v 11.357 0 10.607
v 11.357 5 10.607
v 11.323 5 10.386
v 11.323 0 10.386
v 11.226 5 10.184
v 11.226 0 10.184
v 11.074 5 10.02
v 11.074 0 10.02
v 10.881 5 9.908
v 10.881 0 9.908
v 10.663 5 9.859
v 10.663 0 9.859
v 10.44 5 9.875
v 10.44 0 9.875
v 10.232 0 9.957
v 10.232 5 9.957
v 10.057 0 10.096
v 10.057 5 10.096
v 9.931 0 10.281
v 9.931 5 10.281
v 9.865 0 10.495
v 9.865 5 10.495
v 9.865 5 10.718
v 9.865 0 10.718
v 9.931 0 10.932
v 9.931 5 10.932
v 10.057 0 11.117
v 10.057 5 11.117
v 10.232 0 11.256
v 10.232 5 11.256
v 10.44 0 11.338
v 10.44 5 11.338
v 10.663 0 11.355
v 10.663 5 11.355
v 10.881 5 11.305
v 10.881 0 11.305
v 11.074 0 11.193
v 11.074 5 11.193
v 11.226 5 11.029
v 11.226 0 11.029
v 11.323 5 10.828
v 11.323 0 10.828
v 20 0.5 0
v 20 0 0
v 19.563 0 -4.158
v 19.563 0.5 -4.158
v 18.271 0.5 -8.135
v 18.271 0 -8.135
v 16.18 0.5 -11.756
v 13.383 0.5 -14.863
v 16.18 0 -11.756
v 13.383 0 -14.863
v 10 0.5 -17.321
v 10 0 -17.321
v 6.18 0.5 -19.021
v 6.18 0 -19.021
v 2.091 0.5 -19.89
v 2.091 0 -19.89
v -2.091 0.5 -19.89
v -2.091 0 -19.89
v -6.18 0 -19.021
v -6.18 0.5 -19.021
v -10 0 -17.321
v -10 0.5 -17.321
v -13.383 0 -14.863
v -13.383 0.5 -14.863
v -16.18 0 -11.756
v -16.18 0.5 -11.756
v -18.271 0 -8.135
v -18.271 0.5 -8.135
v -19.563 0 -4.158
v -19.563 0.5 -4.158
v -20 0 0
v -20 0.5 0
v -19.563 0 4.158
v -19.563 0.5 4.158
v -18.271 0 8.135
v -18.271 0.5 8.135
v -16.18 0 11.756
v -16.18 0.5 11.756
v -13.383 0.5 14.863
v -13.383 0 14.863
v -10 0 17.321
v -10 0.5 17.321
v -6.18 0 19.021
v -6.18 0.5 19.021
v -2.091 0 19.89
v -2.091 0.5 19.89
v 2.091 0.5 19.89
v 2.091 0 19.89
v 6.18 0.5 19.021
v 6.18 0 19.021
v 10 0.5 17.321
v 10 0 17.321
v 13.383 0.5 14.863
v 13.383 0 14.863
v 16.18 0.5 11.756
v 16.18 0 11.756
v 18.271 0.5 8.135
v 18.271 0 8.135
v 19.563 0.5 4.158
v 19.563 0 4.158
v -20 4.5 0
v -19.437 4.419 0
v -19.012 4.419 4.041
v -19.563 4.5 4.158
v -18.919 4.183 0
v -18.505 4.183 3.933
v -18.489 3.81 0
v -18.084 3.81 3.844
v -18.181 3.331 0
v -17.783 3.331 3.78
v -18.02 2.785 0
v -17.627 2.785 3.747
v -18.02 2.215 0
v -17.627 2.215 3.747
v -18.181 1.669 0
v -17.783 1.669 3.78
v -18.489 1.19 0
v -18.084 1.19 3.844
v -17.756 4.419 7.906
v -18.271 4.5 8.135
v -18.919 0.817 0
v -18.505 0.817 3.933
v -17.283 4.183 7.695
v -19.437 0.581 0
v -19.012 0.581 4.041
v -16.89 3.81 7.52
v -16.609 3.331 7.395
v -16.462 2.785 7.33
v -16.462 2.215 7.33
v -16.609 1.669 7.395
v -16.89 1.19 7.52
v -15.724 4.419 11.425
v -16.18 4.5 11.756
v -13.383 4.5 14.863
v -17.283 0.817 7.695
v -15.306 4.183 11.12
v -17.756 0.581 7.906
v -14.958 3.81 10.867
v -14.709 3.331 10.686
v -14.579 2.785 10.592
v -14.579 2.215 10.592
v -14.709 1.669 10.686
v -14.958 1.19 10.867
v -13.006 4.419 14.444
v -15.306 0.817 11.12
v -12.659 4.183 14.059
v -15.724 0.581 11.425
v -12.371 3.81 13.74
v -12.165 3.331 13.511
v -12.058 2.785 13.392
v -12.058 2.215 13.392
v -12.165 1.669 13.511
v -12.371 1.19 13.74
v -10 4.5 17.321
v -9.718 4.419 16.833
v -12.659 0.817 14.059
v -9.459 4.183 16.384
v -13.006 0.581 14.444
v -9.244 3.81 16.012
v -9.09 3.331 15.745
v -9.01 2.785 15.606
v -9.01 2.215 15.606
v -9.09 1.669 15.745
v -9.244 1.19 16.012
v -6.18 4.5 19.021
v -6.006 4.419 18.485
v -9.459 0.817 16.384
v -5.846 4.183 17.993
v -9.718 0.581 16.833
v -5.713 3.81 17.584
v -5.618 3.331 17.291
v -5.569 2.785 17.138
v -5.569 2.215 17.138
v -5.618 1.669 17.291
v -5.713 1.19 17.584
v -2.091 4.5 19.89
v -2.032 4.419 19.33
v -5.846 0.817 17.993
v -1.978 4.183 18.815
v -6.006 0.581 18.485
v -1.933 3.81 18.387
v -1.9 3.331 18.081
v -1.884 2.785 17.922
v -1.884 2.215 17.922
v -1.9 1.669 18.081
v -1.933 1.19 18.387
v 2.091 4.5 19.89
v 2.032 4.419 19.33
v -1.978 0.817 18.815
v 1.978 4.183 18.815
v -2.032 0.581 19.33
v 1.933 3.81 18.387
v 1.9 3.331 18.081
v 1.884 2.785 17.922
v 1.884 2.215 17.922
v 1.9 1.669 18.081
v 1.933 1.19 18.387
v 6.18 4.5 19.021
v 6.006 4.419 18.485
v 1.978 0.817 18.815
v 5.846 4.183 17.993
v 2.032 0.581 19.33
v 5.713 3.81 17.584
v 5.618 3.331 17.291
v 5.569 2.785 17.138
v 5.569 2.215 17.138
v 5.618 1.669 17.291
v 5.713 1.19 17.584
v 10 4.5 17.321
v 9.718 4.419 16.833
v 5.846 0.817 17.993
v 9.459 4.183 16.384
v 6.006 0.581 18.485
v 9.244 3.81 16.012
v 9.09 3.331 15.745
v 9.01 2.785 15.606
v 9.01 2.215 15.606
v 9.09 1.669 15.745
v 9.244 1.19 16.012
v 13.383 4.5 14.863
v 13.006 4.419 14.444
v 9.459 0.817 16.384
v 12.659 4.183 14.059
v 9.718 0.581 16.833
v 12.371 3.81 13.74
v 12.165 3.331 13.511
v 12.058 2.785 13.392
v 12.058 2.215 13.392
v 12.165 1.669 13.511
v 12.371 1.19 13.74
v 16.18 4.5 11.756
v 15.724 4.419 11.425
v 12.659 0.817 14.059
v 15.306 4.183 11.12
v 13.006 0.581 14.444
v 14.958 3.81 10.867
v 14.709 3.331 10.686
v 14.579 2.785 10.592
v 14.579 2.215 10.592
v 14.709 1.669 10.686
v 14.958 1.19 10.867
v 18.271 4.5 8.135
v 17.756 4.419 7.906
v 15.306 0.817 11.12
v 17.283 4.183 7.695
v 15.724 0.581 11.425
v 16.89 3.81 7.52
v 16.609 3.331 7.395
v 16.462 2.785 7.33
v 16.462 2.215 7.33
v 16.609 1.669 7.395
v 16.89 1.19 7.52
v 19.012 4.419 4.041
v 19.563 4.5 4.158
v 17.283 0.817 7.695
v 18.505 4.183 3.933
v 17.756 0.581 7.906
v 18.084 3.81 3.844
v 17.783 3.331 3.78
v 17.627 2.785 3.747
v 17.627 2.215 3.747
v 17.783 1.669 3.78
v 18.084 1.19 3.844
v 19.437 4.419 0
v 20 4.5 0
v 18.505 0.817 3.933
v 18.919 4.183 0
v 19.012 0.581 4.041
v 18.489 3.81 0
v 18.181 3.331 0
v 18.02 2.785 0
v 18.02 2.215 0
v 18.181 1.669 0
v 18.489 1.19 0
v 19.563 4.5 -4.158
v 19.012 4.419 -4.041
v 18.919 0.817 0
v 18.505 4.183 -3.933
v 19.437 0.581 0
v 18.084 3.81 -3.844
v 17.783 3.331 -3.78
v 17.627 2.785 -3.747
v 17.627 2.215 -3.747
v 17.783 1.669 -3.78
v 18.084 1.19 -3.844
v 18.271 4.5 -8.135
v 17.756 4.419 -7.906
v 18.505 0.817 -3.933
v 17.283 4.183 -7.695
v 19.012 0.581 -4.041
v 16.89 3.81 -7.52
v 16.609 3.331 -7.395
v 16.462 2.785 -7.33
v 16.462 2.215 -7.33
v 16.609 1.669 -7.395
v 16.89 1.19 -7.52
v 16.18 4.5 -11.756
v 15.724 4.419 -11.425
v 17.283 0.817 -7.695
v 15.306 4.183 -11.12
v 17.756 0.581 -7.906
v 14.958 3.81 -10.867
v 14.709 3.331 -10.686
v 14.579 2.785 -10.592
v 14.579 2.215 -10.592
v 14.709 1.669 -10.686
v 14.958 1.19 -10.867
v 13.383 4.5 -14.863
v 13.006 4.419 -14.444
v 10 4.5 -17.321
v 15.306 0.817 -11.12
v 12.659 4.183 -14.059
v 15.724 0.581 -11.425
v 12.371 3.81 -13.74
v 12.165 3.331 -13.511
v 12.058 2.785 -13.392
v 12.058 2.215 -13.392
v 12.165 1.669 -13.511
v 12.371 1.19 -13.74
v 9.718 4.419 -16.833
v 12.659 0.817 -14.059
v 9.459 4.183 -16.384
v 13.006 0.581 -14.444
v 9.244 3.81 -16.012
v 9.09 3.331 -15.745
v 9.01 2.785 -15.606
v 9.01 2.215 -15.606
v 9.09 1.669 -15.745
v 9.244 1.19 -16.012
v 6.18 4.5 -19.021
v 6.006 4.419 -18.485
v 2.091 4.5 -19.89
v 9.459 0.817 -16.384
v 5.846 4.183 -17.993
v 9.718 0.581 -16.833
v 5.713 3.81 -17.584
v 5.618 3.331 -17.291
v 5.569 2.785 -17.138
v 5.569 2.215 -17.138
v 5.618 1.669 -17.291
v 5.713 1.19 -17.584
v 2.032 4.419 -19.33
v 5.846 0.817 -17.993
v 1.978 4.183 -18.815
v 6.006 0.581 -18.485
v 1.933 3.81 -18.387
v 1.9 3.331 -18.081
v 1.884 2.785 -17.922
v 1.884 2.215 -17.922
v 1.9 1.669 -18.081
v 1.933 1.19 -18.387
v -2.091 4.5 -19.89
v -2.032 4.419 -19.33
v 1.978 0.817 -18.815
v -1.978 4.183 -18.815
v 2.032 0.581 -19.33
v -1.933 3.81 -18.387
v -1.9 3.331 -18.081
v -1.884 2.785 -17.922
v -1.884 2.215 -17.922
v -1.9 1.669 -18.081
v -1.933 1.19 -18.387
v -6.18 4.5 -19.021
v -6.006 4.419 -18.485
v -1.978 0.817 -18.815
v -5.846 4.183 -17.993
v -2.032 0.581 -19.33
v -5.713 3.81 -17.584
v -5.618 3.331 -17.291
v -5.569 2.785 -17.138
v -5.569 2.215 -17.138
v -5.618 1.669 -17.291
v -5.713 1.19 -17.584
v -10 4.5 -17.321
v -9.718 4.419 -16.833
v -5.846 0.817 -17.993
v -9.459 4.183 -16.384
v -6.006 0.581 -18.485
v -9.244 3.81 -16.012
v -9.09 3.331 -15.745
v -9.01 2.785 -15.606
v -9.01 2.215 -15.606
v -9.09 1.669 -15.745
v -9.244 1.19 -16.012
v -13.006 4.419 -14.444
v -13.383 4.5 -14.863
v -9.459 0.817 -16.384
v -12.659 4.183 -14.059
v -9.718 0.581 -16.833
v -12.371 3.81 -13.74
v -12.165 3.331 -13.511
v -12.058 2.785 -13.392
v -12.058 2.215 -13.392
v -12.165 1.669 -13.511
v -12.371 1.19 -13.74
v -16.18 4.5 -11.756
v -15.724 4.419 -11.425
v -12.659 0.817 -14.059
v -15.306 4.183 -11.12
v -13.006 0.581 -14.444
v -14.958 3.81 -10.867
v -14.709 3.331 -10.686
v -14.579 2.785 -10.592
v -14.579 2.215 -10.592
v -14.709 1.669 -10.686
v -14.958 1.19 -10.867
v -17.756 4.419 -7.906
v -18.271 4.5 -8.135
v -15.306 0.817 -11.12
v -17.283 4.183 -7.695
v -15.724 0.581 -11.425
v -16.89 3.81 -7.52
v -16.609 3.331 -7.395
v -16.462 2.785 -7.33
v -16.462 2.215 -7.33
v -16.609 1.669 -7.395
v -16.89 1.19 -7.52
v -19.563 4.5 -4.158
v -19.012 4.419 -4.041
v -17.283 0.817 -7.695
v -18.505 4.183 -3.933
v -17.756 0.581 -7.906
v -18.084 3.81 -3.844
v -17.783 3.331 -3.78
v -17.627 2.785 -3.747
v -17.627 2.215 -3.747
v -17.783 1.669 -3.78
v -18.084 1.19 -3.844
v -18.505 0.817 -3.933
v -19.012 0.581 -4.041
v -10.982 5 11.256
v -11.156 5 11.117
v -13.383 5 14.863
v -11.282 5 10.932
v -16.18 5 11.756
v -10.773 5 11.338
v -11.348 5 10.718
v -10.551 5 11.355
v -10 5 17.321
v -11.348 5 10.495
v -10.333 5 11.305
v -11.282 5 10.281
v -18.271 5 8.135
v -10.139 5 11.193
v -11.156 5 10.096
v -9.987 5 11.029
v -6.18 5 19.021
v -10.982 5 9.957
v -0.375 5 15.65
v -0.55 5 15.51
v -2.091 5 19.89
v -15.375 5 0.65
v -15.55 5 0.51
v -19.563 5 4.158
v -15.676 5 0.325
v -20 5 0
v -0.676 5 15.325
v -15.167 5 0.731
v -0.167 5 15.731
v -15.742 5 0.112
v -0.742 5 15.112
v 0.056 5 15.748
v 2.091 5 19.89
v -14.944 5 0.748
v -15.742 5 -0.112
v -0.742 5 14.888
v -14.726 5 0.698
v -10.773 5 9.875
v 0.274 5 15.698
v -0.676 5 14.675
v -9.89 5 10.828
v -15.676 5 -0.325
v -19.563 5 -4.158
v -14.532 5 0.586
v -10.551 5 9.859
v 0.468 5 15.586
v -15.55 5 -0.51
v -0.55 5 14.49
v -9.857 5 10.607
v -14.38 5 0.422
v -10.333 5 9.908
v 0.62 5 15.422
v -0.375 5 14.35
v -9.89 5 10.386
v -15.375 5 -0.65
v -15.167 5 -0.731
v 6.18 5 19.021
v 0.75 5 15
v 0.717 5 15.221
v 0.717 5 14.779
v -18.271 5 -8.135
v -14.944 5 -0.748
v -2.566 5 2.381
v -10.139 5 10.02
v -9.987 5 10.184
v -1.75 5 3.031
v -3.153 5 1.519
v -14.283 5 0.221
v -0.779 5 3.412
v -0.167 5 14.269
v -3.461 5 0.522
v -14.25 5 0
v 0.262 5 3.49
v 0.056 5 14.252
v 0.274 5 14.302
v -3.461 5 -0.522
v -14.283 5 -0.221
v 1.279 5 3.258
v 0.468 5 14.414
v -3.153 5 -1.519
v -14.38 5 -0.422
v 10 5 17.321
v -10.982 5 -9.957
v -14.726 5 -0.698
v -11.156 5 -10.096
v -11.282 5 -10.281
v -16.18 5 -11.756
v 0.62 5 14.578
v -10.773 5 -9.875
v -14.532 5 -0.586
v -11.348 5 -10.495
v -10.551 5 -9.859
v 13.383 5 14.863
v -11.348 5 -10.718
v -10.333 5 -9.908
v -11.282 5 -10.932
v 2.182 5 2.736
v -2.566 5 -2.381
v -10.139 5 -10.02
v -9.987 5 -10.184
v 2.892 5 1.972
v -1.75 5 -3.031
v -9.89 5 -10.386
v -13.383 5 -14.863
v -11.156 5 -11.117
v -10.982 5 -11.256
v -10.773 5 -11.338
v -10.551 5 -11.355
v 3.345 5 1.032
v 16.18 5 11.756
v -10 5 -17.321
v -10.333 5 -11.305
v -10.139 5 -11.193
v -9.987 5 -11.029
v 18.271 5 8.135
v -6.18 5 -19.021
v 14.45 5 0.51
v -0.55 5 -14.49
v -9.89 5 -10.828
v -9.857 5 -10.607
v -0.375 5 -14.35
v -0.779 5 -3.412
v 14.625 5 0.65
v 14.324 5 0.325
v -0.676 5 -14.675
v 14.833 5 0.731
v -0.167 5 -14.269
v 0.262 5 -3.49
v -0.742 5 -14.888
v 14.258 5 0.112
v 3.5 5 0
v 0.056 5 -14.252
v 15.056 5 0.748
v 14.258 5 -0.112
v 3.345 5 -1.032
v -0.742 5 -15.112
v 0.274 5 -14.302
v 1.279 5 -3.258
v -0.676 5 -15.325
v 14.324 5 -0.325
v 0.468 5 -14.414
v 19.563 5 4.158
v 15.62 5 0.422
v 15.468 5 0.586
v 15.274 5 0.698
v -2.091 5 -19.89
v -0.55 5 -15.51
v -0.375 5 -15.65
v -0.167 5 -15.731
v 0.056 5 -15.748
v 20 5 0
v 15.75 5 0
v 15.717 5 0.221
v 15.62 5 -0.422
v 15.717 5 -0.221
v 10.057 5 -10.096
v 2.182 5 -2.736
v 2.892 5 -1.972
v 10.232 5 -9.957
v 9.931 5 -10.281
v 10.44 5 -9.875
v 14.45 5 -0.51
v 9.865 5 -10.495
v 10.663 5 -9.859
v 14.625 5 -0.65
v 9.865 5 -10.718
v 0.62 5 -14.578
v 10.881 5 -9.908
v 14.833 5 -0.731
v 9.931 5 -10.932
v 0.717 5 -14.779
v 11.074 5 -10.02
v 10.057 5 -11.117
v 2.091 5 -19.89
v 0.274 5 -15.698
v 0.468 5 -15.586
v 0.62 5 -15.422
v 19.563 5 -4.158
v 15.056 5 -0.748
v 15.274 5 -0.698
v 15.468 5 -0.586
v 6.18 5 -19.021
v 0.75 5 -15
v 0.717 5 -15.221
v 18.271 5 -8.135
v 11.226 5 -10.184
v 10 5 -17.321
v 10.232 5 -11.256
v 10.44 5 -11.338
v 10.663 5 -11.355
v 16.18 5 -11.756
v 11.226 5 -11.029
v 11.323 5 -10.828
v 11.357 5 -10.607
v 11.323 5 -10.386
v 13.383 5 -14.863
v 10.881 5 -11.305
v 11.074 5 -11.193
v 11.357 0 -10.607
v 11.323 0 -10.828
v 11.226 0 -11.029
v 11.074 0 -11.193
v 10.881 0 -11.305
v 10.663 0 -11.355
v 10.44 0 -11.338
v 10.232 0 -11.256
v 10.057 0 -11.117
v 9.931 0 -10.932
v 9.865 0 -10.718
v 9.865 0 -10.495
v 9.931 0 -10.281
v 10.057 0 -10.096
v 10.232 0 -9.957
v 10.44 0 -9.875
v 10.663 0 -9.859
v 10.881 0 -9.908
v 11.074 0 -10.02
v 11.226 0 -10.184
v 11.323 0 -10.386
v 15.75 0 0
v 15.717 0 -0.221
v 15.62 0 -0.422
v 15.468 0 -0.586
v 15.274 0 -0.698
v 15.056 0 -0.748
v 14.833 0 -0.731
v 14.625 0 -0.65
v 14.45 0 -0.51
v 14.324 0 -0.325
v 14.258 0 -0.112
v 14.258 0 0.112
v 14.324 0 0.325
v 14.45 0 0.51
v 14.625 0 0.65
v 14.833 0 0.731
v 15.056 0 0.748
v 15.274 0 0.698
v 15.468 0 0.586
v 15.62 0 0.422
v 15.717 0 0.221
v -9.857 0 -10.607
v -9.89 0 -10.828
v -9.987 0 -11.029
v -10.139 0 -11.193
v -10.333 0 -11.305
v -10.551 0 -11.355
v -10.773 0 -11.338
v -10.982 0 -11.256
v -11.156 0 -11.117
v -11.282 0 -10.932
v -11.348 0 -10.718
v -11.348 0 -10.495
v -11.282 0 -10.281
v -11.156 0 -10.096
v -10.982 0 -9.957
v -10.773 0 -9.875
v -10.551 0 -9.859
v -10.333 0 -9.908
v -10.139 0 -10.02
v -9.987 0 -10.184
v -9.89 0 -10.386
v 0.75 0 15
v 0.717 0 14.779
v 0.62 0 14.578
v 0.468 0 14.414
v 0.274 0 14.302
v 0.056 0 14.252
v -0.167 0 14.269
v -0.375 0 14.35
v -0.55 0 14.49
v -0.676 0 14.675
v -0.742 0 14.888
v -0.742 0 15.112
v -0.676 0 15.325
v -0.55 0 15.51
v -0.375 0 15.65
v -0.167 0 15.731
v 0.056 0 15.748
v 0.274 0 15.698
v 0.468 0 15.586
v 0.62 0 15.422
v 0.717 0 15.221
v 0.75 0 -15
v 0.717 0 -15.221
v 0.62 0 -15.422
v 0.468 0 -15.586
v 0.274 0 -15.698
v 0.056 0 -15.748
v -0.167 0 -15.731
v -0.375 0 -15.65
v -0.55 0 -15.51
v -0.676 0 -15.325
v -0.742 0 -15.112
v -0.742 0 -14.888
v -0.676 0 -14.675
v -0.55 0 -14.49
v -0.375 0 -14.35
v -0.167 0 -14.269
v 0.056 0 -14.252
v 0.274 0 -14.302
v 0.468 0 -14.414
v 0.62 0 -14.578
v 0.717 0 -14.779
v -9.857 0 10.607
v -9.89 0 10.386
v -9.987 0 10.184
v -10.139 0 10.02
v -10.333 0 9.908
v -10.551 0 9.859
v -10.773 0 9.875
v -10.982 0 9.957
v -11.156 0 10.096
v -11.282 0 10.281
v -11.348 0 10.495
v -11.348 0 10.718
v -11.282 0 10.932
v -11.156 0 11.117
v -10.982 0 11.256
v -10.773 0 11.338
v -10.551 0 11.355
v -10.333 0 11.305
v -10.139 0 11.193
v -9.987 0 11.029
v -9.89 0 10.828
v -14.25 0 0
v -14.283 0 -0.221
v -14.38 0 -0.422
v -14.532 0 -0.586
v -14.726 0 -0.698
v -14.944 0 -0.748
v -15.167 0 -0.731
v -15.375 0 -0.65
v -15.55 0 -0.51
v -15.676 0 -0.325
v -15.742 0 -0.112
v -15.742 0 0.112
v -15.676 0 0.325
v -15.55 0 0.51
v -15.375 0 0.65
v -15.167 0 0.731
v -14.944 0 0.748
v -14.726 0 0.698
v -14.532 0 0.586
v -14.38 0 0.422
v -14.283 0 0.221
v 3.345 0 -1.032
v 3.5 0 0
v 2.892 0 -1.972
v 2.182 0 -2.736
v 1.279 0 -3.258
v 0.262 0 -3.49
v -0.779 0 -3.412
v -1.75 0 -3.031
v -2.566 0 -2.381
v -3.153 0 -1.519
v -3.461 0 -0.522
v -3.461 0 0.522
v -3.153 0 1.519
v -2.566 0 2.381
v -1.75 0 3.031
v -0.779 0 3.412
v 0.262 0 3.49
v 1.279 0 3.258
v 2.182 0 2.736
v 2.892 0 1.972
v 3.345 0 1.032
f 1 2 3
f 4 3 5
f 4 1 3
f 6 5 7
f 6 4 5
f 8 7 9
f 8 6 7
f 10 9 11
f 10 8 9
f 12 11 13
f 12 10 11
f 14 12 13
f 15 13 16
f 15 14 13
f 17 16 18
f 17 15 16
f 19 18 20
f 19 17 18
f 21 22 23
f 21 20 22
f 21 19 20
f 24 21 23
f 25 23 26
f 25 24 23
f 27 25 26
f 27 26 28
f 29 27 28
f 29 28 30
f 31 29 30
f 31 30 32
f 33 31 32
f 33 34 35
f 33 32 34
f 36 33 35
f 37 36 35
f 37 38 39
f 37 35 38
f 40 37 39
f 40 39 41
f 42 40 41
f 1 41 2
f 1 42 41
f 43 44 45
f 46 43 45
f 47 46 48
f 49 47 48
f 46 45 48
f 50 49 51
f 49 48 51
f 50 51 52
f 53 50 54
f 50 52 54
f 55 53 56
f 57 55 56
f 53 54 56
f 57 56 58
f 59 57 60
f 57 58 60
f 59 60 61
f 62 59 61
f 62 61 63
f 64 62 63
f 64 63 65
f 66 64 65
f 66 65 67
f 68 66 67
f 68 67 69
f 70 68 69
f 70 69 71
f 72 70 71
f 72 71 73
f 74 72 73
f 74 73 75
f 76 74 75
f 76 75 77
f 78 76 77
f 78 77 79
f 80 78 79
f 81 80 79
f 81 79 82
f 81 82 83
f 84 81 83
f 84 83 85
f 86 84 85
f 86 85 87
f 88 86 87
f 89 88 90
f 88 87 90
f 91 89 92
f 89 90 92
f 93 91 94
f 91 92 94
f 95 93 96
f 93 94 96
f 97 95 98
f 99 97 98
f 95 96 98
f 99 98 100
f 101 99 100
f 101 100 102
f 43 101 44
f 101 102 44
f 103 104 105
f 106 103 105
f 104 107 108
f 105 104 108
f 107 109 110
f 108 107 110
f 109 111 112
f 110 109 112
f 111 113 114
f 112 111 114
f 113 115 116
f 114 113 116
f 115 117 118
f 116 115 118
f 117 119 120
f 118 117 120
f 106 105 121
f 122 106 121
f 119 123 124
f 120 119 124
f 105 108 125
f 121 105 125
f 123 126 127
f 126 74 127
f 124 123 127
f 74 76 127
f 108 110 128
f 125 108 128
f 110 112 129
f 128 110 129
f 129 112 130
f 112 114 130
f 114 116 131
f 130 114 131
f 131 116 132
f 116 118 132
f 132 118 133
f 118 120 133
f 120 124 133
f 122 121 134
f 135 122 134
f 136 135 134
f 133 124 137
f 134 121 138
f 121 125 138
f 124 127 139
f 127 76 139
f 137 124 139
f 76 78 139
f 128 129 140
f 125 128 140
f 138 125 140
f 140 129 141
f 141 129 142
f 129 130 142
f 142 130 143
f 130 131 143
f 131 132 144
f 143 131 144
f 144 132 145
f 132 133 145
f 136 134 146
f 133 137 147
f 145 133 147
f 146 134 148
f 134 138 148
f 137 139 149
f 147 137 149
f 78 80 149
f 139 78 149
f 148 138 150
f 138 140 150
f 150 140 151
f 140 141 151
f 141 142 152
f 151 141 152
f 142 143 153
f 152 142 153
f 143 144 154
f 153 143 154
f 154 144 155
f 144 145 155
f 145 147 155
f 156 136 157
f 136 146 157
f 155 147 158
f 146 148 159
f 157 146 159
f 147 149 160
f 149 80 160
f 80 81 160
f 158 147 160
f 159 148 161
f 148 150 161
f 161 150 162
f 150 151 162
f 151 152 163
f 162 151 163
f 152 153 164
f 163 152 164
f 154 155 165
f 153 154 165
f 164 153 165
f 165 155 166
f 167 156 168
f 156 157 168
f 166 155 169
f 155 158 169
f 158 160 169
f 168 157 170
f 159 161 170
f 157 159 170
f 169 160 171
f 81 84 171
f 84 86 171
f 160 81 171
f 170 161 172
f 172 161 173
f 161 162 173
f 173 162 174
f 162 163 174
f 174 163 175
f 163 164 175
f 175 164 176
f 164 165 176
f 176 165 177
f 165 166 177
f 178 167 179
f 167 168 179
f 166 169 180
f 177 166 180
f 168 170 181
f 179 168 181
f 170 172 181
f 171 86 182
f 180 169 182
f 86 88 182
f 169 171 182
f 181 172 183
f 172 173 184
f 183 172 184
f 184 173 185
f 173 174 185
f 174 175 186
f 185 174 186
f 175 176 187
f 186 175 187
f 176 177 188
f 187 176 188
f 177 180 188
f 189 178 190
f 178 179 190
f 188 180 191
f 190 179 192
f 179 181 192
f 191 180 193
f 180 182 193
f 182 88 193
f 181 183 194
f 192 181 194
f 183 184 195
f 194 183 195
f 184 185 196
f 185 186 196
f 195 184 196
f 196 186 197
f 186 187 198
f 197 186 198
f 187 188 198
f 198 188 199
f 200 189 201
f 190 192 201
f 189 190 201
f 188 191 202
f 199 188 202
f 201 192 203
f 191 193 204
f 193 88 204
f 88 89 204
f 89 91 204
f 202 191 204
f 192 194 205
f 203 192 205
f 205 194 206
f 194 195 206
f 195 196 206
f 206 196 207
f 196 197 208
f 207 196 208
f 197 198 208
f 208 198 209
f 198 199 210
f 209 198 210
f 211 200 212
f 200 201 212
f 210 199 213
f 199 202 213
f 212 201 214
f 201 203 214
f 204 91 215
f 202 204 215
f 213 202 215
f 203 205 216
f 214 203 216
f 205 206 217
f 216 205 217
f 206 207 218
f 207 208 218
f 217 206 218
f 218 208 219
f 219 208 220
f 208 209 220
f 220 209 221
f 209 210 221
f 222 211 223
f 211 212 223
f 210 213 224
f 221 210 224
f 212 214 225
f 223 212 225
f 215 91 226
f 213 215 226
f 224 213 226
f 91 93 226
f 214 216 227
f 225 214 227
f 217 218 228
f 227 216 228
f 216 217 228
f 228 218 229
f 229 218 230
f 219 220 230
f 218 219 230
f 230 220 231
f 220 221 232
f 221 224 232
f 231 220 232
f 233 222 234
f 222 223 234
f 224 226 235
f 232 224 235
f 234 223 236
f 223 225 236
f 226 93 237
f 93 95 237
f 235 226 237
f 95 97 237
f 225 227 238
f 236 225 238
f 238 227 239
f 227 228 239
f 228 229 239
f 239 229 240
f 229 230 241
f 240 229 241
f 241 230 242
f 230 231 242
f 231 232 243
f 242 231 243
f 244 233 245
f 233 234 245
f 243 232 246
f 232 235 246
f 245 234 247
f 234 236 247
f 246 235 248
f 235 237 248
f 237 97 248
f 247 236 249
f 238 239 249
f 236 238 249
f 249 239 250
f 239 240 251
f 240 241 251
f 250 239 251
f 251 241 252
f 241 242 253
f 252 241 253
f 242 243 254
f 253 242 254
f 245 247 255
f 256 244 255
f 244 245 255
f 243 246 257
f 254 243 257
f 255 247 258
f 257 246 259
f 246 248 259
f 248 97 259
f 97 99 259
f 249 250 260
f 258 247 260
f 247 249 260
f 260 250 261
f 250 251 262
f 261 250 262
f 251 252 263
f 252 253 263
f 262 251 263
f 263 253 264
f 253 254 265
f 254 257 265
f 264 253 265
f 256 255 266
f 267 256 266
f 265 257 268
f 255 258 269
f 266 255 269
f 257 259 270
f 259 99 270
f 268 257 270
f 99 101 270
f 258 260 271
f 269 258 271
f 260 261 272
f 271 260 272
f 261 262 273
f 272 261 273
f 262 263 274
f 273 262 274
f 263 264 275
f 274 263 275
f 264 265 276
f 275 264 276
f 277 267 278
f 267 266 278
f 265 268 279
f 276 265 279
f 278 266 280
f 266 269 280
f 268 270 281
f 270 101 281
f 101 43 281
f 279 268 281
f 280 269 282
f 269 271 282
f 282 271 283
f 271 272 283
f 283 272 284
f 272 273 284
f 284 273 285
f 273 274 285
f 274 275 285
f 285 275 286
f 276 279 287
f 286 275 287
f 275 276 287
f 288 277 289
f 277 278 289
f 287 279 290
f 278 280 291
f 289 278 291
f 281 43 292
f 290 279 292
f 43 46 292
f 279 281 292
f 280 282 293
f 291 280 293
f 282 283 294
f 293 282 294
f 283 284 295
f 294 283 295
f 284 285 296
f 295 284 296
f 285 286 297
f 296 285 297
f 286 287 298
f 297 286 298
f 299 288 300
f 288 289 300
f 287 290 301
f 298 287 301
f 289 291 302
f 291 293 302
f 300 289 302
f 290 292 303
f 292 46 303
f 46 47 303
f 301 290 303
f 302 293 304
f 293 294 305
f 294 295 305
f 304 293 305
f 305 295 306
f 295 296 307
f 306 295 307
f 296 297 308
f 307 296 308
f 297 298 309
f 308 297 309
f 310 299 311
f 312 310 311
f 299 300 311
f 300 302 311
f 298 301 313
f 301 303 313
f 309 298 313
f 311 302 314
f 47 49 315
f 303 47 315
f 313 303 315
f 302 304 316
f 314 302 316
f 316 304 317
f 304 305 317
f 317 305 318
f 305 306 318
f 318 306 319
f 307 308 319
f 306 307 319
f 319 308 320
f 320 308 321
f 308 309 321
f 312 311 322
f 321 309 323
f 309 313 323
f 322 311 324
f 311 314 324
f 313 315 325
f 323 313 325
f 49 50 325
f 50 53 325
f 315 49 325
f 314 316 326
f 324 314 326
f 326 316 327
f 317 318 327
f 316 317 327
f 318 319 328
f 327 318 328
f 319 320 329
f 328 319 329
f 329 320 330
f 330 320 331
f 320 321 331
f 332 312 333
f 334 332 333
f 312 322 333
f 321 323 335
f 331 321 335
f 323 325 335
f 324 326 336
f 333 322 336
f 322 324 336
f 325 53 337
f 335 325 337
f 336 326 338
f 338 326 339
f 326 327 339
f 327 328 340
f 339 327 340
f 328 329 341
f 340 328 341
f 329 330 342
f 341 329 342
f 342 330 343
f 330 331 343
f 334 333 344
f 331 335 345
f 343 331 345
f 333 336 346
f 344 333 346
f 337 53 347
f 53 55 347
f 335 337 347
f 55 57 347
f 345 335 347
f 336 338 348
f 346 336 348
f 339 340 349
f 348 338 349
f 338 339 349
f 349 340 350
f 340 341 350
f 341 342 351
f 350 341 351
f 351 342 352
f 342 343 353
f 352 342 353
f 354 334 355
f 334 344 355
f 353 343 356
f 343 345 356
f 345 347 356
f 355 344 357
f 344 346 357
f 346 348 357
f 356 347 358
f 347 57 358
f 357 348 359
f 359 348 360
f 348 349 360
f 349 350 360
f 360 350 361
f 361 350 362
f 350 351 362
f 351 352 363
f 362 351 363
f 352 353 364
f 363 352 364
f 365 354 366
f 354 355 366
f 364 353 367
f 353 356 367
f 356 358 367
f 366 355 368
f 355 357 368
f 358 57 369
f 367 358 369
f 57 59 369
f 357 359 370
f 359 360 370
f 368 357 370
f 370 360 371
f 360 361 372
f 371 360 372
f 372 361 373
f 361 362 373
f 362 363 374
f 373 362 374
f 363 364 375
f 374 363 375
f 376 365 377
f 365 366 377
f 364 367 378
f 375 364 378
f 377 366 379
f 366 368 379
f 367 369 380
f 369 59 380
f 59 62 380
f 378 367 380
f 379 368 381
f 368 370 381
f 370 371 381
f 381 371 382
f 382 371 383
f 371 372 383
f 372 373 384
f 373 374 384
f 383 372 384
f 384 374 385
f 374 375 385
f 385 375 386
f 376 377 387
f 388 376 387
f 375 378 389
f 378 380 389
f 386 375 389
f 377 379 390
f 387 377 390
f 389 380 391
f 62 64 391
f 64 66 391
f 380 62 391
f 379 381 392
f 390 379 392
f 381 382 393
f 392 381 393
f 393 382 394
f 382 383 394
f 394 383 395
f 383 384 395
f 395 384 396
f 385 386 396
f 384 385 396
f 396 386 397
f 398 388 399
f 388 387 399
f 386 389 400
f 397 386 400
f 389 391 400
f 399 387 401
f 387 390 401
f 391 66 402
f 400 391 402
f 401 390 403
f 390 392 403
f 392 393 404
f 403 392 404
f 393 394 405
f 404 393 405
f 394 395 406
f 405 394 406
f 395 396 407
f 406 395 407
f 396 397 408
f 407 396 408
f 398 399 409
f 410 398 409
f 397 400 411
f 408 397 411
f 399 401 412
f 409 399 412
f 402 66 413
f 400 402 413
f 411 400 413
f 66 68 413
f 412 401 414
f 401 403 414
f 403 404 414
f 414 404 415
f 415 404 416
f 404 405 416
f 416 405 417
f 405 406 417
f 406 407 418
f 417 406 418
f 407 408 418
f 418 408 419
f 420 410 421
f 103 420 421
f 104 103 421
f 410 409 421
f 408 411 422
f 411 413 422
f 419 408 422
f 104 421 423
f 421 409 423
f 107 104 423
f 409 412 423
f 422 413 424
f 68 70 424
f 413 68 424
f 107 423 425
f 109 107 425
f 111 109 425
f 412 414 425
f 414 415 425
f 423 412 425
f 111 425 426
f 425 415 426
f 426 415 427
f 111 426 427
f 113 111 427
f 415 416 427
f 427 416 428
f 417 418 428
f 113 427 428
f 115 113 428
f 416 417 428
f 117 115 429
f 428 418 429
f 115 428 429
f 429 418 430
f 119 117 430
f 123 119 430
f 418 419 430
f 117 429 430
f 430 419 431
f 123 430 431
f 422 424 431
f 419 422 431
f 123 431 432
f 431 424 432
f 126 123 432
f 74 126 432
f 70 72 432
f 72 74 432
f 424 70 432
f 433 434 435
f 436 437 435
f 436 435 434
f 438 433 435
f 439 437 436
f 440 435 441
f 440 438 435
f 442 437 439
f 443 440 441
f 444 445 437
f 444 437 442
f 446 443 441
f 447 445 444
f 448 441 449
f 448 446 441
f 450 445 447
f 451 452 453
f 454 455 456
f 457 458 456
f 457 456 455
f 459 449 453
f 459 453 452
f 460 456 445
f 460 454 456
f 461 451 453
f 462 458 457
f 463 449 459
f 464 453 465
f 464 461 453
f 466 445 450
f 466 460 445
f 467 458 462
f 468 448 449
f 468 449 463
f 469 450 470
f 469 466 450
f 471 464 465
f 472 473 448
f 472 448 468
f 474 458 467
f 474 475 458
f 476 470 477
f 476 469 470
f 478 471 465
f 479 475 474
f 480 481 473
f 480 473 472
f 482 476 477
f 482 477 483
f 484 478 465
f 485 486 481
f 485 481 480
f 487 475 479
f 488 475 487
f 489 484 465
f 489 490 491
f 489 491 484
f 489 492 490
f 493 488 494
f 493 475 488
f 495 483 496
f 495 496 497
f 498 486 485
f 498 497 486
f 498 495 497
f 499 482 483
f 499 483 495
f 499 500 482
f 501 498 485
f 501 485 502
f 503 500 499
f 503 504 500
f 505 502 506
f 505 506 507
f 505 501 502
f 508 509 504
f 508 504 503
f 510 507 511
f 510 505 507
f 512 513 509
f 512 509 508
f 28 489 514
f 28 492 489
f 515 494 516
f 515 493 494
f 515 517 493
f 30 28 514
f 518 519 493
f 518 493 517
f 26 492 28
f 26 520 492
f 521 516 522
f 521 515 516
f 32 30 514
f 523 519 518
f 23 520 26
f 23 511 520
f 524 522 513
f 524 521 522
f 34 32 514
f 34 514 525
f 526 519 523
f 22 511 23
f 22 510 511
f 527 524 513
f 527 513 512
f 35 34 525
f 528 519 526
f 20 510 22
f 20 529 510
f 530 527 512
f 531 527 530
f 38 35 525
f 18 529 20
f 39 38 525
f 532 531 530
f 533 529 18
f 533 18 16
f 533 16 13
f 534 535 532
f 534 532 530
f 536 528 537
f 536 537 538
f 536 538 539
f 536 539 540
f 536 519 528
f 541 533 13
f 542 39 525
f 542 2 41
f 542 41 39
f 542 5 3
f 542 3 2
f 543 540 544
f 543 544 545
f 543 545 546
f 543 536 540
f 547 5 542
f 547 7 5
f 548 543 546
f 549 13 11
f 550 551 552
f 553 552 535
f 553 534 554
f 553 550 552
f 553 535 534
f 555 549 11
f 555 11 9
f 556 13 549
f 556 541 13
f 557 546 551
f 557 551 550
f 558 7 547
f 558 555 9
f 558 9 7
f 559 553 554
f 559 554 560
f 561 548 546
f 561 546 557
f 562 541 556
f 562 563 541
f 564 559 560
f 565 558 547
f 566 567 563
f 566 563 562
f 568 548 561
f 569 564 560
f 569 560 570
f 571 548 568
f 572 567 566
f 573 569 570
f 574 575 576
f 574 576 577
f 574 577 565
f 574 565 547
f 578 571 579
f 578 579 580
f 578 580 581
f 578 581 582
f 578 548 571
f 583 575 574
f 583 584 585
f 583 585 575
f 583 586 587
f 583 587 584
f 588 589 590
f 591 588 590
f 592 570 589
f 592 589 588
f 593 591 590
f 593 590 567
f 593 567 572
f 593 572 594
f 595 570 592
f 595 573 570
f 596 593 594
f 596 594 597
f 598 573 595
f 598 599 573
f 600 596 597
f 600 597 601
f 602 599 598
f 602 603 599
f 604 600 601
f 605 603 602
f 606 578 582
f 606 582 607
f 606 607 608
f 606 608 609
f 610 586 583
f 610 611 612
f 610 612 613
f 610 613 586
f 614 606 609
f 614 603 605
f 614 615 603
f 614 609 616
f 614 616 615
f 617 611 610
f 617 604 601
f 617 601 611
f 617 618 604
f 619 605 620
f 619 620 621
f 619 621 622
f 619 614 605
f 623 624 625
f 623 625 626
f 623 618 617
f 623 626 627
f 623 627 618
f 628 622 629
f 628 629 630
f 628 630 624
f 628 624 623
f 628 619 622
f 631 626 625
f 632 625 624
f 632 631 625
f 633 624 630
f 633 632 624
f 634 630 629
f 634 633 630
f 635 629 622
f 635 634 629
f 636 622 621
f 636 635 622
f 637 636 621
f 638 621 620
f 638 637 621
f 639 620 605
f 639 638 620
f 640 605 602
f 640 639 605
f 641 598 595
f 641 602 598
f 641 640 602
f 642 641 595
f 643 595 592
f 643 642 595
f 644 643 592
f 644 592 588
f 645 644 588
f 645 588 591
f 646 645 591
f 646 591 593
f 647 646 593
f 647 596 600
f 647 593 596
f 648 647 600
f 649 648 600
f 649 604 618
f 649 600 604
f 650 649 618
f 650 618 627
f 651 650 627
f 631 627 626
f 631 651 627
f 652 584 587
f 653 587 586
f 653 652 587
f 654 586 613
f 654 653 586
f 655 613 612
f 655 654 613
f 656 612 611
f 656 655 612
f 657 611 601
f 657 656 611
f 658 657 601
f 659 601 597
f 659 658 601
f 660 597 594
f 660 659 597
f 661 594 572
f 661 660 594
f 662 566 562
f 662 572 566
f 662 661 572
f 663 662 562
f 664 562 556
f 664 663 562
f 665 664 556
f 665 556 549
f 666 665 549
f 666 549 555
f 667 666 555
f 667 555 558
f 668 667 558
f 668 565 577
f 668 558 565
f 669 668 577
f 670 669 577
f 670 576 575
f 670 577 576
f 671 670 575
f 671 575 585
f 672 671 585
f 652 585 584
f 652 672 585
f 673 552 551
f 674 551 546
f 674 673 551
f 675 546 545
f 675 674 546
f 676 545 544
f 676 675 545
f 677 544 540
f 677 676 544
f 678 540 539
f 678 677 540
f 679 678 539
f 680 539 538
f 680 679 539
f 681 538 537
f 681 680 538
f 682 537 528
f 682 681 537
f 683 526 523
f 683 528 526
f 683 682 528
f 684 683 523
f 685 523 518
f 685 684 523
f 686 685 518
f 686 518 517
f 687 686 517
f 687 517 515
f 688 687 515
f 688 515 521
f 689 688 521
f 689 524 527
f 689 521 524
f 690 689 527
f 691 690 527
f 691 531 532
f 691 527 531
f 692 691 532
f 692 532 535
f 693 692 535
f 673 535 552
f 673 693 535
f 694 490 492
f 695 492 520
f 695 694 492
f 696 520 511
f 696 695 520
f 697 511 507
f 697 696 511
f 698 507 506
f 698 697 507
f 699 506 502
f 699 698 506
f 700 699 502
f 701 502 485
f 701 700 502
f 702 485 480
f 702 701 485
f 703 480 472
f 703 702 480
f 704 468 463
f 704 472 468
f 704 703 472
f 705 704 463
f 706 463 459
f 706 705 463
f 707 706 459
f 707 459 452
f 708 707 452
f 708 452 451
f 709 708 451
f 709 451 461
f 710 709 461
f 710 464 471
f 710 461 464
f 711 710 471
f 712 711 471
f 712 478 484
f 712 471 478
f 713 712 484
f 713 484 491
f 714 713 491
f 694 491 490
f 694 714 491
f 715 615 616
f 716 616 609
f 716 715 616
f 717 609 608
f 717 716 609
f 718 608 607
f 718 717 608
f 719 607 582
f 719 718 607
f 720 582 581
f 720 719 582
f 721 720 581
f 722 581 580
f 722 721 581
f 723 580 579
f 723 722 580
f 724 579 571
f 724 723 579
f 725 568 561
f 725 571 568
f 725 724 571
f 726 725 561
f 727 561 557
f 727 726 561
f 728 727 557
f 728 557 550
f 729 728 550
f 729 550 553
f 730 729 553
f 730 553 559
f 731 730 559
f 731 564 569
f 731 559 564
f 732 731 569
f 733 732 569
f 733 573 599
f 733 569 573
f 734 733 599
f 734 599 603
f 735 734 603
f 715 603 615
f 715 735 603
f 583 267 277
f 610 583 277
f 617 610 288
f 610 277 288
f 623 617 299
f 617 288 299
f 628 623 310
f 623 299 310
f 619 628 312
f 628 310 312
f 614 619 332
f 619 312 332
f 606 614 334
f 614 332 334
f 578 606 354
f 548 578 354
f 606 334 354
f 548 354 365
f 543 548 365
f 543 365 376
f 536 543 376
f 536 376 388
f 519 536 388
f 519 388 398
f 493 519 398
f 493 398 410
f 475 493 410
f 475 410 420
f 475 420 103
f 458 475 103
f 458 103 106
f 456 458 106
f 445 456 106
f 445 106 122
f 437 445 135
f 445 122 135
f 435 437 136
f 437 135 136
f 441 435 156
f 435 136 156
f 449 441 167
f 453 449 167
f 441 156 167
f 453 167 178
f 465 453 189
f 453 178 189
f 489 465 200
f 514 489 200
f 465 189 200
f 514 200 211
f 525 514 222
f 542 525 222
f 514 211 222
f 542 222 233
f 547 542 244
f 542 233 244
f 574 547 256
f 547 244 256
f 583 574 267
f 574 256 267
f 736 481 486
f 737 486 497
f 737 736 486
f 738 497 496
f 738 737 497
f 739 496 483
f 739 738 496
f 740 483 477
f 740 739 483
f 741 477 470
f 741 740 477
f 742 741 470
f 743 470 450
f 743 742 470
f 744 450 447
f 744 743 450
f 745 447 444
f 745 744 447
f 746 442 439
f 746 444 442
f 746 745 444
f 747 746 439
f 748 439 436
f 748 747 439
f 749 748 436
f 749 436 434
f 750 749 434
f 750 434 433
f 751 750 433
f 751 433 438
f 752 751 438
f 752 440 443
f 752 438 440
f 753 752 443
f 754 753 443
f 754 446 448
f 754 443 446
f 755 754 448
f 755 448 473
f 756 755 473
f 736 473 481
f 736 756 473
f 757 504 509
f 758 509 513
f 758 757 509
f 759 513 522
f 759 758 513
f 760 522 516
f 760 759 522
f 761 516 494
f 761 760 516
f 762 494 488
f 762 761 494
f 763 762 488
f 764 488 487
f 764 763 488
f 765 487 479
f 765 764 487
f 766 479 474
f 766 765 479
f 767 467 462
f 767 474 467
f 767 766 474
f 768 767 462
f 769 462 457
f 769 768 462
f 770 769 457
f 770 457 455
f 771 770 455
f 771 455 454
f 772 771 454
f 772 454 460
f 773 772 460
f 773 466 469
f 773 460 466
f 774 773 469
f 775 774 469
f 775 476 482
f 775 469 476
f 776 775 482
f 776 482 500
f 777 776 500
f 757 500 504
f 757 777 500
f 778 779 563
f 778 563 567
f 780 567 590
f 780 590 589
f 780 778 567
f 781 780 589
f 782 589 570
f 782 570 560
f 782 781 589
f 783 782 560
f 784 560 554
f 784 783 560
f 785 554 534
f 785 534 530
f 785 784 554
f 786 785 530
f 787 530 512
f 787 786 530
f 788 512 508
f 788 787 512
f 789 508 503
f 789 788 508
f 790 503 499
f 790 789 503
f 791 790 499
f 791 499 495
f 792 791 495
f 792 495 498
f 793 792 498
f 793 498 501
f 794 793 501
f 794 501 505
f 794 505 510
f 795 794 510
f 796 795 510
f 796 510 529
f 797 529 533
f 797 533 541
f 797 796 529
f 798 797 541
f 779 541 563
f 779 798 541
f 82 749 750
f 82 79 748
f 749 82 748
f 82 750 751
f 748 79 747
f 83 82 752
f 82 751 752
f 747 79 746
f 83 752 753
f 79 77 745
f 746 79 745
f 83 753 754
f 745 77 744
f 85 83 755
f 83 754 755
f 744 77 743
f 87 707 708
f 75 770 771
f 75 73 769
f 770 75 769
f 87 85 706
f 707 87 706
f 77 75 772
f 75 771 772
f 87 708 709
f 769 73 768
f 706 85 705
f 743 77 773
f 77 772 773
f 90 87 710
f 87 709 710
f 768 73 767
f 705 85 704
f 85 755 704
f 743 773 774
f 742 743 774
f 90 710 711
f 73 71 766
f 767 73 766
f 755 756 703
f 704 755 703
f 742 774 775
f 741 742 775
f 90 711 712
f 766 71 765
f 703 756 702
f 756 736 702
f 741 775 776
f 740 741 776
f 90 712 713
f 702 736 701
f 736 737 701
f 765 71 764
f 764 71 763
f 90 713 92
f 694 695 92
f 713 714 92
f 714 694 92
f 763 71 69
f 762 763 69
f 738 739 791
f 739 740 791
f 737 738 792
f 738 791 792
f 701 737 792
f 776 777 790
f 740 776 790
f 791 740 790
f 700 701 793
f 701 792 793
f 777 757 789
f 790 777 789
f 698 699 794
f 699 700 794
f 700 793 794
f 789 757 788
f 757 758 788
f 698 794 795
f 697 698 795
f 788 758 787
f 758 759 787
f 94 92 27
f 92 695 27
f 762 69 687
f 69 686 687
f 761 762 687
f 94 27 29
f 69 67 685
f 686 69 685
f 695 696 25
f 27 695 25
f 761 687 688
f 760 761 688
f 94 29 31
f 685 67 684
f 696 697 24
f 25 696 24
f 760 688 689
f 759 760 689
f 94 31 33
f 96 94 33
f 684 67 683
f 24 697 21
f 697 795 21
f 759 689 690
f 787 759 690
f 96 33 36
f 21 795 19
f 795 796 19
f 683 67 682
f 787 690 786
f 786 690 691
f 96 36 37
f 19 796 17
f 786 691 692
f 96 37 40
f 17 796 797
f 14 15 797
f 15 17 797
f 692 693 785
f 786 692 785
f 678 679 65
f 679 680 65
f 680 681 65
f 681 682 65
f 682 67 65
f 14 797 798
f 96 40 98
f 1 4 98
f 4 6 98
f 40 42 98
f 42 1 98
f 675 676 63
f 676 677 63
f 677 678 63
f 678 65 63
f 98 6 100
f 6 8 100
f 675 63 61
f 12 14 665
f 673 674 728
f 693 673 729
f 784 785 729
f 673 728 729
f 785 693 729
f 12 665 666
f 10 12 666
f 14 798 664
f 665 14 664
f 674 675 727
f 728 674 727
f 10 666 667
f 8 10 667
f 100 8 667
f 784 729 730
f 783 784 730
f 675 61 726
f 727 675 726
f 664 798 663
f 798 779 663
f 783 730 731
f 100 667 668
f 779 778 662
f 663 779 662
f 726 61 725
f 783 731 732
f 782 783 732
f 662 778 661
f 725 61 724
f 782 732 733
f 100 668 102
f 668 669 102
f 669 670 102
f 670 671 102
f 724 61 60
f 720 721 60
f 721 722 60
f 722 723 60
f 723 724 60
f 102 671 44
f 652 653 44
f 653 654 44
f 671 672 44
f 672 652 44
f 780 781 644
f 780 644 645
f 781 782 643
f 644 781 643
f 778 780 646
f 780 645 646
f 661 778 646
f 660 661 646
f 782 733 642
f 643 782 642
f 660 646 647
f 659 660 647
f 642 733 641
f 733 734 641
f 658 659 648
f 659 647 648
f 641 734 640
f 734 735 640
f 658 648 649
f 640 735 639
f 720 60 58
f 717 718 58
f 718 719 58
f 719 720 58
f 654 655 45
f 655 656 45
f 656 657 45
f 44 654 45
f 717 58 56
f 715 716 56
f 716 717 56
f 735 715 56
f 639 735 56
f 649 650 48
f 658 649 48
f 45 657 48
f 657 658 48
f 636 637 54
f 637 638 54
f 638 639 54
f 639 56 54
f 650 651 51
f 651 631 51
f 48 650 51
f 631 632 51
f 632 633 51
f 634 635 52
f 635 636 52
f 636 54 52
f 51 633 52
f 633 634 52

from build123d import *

# Parameters (mm, degrees)
SKETCH1_R           = 20
SKETCH1_R_2         = 3.5
BOSS_EXTRUDE1_DEPTH = 5
SKETCH3_R           = 0.75
CUT_EXTRUDE1_DEPTH  = 6


with BuildPart() as part:
    # Sketch1 → Boss-Extrude1 (new body)
    with BuildSketch(Plane(origin=(0, 0, 0), x_dir=(1, 0, 0), z_dir=(0, 1, 0))):
        Circle(SKETCH1_R)
        Circle(SKETCH1_R_2, mode=Mode.SUBTRACT)
    extrude(amount=BOSS_EXTRUDE1_DEPTH)

    # Sketch2 → Cut-Revolve1 (revolve, cut)
    with BuildSketch(Plane.XY):
        with BuildLine():
            Line((-20, 0.5), (-20, 4.5))
            ThreePointArc((-20, 4.5), (-18, 2.5), (-20, 0.5))
        make_face()
    revolve(axis=Axis((0, 0, 0), (0, 1, 0)), mode=Mode.SUBTRACT)

    # Sketch3 → Cut-Extrude1 (cut, through all)
    with BuildSketch(Plane(origin=(0, 0, 0), x_dir=(1, 0, 0), z_dir=(0, 1, 0))):
        with Locations((0, -15)):
            Circle(SKETCH3_R)
        with Locations((-10.606601718, -10.606601718)):
            Circle(SKETCH3_R)
        with Locations((-15, 0)):
            Circle(SKETCH3_R)
        with Locations((-10.606601718, 10.606601718)):
            Circle(SKETCH3_R)
        with Locations((0, 15)):
            Circle(SKETCH3_R)
        with Locations((10.606601718, 10.606601718)):
            Circle(SKETCH3_R)
        with Locations((15, 0)):
            Circle(SKETCH3_R)
        with Locations((10.606601718, -10.606601718)):
            Circle(SKETCH3_R)
    extrude(amount=CUT_EXTRUDE1_DEPTH, mode=Mode.SUBTRACT)


solid = part.part
